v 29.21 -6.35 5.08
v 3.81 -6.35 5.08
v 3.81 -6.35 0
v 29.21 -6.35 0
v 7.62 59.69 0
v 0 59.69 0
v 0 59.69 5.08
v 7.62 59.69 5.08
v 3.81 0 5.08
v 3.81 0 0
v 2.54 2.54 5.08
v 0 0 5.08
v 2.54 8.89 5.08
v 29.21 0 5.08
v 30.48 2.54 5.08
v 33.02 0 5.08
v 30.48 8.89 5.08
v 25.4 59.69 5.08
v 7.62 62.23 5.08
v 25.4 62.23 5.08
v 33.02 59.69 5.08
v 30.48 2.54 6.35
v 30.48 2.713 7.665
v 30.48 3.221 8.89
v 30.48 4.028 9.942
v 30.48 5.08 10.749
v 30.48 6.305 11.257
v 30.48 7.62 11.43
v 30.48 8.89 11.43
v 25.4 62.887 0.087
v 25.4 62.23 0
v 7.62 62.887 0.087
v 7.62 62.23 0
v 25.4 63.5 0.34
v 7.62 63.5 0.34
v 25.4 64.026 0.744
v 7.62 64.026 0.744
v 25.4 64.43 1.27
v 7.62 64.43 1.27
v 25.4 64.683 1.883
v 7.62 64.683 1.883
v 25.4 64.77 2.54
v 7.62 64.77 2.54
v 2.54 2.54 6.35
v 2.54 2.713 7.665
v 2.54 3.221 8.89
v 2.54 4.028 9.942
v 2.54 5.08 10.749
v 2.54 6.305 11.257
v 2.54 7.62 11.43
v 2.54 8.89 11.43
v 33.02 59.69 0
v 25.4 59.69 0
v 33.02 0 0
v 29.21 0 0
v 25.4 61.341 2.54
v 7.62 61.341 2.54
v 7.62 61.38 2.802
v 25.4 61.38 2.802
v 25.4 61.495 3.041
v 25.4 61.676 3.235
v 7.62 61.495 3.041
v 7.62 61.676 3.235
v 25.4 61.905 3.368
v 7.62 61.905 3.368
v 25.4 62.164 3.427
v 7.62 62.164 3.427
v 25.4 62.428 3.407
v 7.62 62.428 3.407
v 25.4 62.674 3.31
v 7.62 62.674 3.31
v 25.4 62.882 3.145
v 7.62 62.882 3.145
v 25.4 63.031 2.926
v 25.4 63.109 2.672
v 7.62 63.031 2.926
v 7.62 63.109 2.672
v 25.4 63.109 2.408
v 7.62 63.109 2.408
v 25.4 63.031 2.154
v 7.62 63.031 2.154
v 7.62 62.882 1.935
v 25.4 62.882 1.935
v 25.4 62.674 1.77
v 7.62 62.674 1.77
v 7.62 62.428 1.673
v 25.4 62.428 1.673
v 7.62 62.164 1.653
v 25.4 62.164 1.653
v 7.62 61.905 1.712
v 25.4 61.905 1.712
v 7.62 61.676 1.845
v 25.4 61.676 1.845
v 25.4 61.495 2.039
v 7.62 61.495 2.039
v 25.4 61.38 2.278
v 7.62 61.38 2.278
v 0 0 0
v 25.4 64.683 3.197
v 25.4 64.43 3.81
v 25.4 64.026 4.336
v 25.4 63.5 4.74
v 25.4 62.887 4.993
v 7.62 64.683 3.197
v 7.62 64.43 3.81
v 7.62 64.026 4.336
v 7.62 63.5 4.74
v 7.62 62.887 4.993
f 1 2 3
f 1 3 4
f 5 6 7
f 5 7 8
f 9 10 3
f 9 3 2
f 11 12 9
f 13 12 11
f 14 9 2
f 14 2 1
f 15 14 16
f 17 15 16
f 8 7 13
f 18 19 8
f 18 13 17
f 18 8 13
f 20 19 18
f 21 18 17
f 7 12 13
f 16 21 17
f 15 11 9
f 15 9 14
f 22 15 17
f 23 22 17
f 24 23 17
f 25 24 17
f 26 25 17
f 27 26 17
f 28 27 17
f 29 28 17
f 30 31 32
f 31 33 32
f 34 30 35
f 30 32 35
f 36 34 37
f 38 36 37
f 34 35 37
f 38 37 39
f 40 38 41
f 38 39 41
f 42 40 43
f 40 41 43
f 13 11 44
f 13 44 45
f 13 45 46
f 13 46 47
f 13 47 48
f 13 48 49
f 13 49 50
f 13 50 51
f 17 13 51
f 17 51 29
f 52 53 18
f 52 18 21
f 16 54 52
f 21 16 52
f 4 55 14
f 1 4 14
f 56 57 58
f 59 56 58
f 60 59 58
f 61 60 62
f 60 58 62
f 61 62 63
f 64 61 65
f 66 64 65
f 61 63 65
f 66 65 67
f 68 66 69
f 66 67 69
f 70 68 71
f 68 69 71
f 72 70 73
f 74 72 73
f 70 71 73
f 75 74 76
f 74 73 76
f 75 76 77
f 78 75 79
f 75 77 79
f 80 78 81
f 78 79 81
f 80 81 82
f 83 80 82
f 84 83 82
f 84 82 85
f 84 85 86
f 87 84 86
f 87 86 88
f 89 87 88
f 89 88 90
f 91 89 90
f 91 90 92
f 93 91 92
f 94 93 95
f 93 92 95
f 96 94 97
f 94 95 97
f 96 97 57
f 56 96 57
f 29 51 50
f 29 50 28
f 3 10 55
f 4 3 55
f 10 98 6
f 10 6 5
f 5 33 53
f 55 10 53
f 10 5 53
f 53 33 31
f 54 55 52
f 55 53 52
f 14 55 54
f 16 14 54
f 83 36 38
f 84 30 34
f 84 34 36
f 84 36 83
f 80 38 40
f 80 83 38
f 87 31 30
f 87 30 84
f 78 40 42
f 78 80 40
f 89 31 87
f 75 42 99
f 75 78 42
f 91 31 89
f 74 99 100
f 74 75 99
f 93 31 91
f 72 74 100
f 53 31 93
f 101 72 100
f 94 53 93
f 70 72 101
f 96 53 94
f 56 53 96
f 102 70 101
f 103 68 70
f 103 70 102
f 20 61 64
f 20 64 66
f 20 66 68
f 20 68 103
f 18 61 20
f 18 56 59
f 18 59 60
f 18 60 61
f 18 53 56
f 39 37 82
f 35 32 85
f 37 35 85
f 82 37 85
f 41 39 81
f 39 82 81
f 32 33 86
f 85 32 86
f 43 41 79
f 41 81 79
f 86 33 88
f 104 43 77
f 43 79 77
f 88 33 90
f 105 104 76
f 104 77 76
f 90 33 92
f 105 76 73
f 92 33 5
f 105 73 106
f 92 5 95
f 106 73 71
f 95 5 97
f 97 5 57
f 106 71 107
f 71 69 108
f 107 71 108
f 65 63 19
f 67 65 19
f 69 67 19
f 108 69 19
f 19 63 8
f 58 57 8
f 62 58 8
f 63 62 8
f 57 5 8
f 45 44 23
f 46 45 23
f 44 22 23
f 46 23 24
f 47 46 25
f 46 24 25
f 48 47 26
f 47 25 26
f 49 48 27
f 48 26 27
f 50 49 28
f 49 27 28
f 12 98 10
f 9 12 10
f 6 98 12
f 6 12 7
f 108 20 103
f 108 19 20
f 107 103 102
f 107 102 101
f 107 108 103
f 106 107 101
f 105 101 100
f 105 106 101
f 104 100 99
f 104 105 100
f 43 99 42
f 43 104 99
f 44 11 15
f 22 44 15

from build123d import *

# Parameters (mm, degrees)
F0_W      = 33.02
F0_H      = 59.69
F1_DEPTH  = 5.08
F2_W      = 17.78
F2_H      = 5.08
F3_DEPTH  = 5.08
F4_R      = 0.889
F5_DEPTH  = 17.78
F6_R      = 2.53999
F7_W      = 27.94
F7_H      = 6.35
F8_DEPTH  = 6.35
F9_R      = 5.08
F10_W     = 25.4
F10_H     = 5.08
F11_DEPTH = 6.35


# Not quite as in the source:
# - a fillet or chamfer is up to 0.001 mm smaller than in the source, because OpenCascade refuses the exact size


with BuildPart() as f1:
    # F0 (on Top) → F1 (new body)
    with BuildSketch(Plane.XY):
        with Locations((16.51, 29.845)):
            Rectangle(F0_W, F0_H)
    extrude(amount=F1_DEPTH)

    # F2 (on face) → F3 (join)
    with BuildSketch(Plane(origin=(0, 59.69, 0), x_dir=(-1, 0, 0), z_dir=(0, 1, 0))):
        with Locations((-16.51, 2.54)):
            Rectangle(F2_W, F2_H)
    extrude(amount=F3_DEPTH)

    # F4 (on face) → F5 (cut)
    with BuildSketch(Plane(origin=(7.62, 0, 0), x_dir=(0, -1, 0), z_dir=(-1, 0, 0))):
        with Locations((-62.23, 2.54)):
            Circle(F4_R)
    extrude(amount=-F5_DEPTH, mode=Mode.SUBTRACT)

    # F6 (radius 2.54 in the source; OpenCascade refuses exactly that, so slightly less here)
    f6_edges = [f1.edges().sort_by_distance(p)[0] for p in [
        (16.51, 64.77, 0),
        (16.51, 64.77, 5.08),
    ]]
    fillet(f6_edges, radius=F6_R)

    # F7 (on face) → F8 (join)
    with BuildSketch(Plane.XY.offset(5.08)):
        with Locations((16.51, 5.715)):
            Rectangle(F7_W, F7_H)
    extrude(amount=F8_DEPTH)

    # F9
    f9_edges = [f1.edges().sort_by_distance(p)[0] for p in [
        (16.51, 2.54, 11.43),
    ]]
    fillet(f9_edges, radius=F9_R)

    # F10 (on face) → F11 (join)
    with BuildSketch(Plane.XZ):
        with Locations((16.51, 2.54)):
            Rectangle(F10_W, F10_H)
    extrude(amount=F11_DEPTH)


solid = f1.part
